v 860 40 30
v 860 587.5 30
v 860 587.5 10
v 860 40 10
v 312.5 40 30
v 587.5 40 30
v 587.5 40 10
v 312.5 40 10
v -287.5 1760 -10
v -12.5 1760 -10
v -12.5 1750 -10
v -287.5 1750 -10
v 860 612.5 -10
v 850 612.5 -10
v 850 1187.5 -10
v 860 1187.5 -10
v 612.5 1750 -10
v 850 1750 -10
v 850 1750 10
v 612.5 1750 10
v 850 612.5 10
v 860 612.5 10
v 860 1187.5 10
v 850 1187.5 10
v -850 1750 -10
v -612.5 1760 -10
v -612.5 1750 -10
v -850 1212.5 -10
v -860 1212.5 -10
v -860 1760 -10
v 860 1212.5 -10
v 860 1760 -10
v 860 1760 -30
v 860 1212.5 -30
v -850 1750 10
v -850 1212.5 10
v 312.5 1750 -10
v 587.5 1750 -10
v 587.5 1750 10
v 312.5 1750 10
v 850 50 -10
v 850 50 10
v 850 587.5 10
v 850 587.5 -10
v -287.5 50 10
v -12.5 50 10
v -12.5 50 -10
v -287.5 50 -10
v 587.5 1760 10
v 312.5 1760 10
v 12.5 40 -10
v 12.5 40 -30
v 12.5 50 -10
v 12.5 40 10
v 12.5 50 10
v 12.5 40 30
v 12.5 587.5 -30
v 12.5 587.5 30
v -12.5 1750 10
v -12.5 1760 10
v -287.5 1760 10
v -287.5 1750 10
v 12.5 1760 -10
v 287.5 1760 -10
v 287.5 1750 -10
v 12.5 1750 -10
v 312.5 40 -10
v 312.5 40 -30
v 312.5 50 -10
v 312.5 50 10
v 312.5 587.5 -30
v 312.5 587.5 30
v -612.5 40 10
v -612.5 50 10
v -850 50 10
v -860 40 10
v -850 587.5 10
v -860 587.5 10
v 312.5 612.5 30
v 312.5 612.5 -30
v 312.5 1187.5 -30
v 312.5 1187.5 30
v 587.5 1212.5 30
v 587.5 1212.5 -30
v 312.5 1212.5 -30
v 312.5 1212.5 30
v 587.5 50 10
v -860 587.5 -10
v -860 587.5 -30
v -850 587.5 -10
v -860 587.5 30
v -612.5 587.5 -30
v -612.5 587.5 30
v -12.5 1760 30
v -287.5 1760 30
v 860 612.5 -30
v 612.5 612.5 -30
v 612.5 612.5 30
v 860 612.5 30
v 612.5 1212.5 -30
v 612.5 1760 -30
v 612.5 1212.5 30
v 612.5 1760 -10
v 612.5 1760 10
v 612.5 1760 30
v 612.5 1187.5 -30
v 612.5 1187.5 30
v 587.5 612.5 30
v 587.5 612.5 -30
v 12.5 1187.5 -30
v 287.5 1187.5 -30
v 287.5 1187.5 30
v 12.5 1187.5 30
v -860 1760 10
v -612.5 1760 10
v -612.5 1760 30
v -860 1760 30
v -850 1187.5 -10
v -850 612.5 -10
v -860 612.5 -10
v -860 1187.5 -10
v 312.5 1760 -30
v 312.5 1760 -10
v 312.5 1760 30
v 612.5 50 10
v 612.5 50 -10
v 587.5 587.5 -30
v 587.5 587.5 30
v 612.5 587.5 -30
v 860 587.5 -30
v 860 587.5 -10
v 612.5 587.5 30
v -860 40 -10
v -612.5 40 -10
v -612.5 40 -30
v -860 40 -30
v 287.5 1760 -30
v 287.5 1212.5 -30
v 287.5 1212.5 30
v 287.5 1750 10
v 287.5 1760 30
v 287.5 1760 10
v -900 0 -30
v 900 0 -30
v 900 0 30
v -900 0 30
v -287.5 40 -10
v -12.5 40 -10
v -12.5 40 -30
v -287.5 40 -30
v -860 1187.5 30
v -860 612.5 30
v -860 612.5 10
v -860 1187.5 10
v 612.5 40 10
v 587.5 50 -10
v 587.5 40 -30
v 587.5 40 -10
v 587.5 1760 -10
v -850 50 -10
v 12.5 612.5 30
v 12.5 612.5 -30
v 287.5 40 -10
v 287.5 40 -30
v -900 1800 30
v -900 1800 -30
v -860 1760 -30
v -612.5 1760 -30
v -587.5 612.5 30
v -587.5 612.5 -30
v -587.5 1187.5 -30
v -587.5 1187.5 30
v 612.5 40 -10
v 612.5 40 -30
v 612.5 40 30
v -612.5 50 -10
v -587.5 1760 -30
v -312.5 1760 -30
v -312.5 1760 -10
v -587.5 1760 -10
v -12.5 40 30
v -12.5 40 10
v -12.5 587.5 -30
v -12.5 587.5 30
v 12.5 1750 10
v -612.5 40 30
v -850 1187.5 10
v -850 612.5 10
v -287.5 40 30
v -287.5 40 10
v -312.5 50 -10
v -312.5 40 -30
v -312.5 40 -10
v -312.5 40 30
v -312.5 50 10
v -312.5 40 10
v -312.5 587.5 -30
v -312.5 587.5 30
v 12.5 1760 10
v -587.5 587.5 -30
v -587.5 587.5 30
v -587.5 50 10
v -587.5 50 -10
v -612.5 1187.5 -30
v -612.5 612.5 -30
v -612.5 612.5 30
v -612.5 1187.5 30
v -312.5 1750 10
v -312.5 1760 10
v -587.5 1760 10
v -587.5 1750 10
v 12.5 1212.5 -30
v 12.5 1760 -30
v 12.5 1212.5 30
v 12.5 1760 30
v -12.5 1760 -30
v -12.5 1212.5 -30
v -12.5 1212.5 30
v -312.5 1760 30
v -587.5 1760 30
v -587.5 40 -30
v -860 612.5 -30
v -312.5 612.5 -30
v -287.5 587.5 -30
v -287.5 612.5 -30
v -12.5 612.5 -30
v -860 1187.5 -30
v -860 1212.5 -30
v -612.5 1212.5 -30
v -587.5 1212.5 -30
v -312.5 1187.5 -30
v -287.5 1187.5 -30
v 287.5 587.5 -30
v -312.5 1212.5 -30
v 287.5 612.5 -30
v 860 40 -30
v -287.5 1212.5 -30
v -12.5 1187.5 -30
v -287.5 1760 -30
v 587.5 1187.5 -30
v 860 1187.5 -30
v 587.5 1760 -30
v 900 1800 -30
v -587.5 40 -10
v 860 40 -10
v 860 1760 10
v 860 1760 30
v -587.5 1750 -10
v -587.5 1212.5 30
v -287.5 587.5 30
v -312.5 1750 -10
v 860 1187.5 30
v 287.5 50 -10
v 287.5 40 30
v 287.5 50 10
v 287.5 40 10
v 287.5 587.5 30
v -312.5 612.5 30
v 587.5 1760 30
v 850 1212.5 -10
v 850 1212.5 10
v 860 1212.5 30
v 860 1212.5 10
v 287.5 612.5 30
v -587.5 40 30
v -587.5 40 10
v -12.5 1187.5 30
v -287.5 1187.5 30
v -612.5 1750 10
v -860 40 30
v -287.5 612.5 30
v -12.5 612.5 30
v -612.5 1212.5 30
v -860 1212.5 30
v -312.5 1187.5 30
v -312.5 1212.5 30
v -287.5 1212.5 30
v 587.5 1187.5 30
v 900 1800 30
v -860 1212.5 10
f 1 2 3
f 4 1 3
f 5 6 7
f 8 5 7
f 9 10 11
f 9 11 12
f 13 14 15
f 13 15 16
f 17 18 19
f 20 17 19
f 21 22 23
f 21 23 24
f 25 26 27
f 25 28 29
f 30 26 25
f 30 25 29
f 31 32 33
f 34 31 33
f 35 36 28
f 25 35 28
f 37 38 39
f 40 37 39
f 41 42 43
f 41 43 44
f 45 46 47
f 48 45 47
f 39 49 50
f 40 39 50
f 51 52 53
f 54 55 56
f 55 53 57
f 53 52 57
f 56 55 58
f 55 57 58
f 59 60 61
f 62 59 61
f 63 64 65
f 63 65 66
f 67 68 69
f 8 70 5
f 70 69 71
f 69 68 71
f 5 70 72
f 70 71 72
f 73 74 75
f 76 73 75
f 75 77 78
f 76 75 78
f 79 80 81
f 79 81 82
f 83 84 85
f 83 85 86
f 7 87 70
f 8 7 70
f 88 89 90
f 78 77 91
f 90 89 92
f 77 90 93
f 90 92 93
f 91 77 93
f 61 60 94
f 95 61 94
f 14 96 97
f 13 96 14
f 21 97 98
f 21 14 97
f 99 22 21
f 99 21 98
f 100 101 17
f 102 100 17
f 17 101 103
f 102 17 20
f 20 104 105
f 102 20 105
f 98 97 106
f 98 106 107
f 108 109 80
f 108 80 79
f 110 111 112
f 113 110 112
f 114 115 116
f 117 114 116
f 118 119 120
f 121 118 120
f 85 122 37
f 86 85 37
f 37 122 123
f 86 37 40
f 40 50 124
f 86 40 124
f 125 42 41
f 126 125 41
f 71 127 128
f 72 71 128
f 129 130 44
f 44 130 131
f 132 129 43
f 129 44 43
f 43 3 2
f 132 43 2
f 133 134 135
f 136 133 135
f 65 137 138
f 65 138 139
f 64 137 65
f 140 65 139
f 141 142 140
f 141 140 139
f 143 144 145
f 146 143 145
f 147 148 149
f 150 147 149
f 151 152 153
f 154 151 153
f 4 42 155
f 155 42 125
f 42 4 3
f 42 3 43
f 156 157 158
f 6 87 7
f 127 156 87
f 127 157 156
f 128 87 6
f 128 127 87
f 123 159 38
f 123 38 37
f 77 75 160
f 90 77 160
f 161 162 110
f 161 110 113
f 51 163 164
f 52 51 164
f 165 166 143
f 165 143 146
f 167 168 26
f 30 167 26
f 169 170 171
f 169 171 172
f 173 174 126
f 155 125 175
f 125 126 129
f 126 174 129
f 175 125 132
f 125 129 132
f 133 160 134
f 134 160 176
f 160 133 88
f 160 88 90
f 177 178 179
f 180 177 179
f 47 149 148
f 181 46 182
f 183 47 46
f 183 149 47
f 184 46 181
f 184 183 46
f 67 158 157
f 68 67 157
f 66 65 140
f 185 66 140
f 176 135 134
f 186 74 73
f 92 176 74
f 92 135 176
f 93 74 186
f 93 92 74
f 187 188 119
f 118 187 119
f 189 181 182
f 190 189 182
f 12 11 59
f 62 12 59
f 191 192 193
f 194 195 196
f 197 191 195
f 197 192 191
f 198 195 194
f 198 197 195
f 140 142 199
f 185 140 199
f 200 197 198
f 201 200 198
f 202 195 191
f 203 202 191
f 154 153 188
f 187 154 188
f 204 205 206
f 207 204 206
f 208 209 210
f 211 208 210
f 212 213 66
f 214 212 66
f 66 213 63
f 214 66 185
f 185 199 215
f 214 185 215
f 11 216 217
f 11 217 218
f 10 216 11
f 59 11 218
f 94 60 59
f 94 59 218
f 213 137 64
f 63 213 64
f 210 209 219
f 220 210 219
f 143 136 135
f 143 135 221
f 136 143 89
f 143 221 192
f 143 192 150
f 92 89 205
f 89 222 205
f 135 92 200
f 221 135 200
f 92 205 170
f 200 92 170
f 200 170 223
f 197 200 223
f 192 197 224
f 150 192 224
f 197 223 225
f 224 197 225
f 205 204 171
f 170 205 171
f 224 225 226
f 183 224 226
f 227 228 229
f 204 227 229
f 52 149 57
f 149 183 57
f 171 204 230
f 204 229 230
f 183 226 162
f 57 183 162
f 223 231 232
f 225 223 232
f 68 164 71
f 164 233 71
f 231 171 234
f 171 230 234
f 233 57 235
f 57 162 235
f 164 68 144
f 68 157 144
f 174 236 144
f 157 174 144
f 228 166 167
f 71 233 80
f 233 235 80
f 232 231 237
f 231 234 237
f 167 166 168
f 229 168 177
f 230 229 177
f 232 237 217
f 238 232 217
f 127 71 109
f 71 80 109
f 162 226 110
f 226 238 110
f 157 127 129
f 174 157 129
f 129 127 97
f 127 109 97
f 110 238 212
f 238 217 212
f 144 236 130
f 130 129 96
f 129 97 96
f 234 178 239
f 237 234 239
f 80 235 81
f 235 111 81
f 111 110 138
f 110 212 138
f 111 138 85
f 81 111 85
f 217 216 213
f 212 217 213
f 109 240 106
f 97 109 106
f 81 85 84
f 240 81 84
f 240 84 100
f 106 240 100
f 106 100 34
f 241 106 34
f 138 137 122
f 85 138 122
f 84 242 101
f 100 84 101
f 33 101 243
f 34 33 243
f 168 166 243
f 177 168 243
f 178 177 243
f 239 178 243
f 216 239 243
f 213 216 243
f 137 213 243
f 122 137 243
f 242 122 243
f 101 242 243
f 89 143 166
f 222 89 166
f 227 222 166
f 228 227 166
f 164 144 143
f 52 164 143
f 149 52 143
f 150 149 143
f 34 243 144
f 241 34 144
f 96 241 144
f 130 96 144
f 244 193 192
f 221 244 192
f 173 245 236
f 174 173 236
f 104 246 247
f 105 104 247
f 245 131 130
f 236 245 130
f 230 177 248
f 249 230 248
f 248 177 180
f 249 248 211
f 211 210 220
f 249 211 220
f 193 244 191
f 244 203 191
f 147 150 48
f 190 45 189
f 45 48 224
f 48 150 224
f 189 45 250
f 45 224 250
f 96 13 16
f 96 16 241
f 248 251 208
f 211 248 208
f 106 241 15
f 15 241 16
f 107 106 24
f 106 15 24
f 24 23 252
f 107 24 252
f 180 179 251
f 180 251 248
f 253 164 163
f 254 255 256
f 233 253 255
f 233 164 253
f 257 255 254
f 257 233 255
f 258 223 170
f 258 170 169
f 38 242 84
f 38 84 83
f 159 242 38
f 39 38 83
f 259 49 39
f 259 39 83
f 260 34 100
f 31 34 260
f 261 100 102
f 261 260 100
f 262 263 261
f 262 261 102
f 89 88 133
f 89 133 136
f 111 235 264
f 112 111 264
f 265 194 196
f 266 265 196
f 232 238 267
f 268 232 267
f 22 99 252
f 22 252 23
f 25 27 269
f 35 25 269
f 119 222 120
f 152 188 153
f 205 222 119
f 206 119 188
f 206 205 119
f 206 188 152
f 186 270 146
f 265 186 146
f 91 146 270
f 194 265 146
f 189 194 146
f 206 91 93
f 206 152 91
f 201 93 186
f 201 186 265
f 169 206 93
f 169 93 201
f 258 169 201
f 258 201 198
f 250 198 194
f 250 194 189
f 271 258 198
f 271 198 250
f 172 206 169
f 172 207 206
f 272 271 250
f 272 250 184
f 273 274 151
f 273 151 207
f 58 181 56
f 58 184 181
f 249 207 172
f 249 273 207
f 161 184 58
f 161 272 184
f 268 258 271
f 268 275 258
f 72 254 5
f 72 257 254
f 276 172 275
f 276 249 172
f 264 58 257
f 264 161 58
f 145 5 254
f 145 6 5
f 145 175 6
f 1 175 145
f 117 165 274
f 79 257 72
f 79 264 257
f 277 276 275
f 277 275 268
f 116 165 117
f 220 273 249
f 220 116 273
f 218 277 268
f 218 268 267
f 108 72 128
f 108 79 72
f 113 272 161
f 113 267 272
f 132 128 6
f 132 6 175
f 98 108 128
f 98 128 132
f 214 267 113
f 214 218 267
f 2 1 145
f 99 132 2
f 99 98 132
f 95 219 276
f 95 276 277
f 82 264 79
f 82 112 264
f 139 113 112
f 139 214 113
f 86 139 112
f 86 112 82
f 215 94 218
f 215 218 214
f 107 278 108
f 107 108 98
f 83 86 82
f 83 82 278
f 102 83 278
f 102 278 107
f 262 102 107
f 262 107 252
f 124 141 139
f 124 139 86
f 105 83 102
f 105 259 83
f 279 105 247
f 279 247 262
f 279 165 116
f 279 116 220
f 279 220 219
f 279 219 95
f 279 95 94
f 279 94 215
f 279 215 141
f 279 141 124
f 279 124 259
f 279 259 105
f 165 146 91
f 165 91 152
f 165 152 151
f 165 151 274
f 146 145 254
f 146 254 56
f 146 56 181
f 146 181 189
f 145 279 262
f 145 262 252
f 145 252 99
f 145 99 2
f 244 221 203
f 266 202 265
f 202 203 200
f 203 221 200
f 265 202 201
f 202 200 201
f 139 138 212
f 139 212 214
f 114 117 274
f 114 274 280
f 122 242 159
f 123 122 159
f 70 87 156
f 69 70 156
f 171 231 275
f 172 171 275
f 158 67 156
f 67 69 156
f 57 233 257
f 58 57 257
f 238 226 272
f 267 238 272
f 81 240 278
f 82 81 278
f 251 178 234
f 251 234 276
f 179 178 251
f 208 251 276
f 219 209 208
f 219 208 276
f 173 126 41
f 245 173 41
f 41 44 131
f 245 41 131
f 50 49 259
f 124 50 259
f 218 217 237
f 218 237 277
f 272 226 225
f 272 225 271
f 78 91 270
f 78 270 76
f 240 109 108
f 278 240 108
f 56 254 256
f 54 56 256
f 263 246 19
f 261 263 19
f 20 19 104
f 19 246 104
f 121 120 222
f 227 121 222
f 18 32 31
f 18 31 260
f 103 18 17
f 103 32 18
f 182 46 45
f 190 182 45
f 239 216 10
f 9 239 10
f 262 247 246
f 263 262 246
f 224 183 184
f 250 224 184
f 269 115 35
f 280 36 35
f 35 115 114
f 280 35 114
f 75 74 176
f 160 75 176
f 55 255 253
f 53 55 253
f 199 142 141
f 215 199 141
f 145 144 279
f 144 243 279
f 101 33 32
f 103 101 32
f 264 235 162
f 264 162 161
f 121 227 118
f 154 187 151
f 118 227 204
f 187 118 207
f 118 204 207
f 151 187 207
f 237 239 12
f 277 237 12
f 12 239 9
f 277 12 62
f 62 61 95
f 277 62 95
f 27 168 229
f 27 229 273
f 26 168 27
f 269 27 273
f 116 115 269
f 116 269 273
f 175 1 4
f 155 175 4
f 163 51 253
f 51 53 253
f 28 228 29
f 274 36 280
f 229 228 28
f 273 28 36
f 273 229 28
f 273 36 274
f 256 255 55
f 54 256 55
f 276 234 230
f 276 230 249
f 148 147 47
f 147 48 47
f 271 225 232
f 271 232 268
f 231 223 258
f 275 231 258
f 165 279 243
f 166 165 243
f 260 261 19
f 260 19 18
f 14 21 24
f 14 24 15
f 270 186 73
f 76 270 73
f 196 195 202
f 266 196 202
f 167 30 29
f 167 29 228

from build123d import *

# Parameters (mm, degrees)
EXTRUDE_1_DEPTH        = 900
EXTRUDE_1_2_DEPTH      = 900
EXTRUDE_2_DEPTH        = 1720
EXTRUDE_2_2_DEPTH      = 1720
SKETCH_4_W             = 50
SKETCH_4_H             = 60
CUT_EXTRUDE_1_DEPTH    = 10
SKETCH_5_W             = 50
SKETCH_5_H             = 60
CUT_EXTRUDE_2_DEPTH    = 10
SKETCH_6_W             = 60
SKETCH_6_H             = 25
EXTRUDE_3_DEPTH        = 1720
PATTERN_LINEAR_1_COUNT = 2
PATTERN_LINEAR_1_PITCH = 600
SKETCH_7_W             = 25
SKETCH_7_H             = 60
EXTRUDE_4_DEPTH        = 1729
PATTERN_LINEAR_2_COUNT = 5
PATTERN_LINEAR_2_PITCH = 300


with BuildPart() as part:
    # 草图1 → 凸台-拉伸1 (new, symmetric)
    with BuildSketch(Plane(origin=(0, 0, 0), x_dir=(0, 0, -1), z_dir=(1, 0, 0))):
        Polygon((30, 0), (-30, 0), (-30, 40), (-10, 40), (-10, 50), (10, 50), (10, 40), (30, 40), align=None)
    extrude(amount=EXTRUDE_1_DEPTH, both=True)

    # 草图5 → 切除-拉伸2 (cut)
    with BuildSketch(Plane(origin=(0, 40, 0), x_dir=(1, 0, 0), z_dir=(0, 1, 0))):
        with Locations((-875, 0)):
            Rectangle(SKETCH_5_W, SKETCH_5_H)
        with Locations((875, 0)):
            Rectangle(SKETCH_5_W, SKETCH_5_H)
    extrude(amount=CUT_EXTRUDE_2_DEPTH, mode=Mode.SUBTRACT)



with BuildPart() as body_2:
    # 草图1 → Extrude 1 2 (new, symmetric)
    with BuildSketch(Plane(origin=(0, 0, 0), x_dir=(0, 0, -1), z_dir=(1, 0, 0))):
        Polygon((30, 1800), (30, 1760), (10, 1760), (10, 1750), (-10, 1750), (-10, 1760), (-30, 1760), (-30, 1800), align=None)
    extrude(amount=EXTRUDE_1_2_DEPTH, both=True)

    # 草图4 → 切除-拉伸1 (cut)
    with BuildSketch(Plane.XZ.offset(-1760)):
        with Locations((-875, 0)):
            Rectangle(SKETCH_4_W, SKETCH_4_H)
        with Locations((875, 0)):
            Rectangle(SKETCH_4_W, SKETCH_4_H)
    extrude(amount=CUT_EXTRUDE_1_DEPTH, mode=Mode.SUBTRACT)


with BuildPart() as body_3:
    # 草图3 → 凸台-拉伸2 (new body)
    with BuildSketch(Plane.XZ.offset(-1760)):
        Polygon((-900, -30), (-900, 30), (-860, 30), (-860, 10), (-850, 10), (-850, -10), (-860, -10), (-860, -30), align=None)
    extrude(amount=EXTRUDE_2_DEPTH)



with BuildPart() as body_4:
    # 草图3 → Extrude 2 2 (new body)
    with BuildSketch(Plane.XZ.offset(-1760)):
        Polygon((860, -30), (900, -30), (900, 30), (860, 30), (860, 10), (850, 10), (850, -10), (860, -10), align=None)
    extrude(amount=EXTRUDE_2_2_DEPTH)


with BuildPart() as body_3_1:
    add(body_3.part)

    add(body_4.part)  # 凸台-拉伸3 merges body 4
    # 草图6 → 凸台-拉伸3 (add)
    with BuildSketch(Plane.ZY.offset(-860)):
        with Locations((0, 1200)):
            Rectangle(SKETCH_6_W, SKETCH_6_H)
    extrude_3 = extrude(amount=EXTRUDE_3_DEPTH)

    # 阵列(线性)1: 凸台-拉伸3 ×2
    with Locations(*[(0, -i * PATTERN_LINEAR_1_PITCH, 0) for i in range(1, PATTERN_LINEAR_1_COUNT)]):
        add(extrude_3)


with BuildPart() as part_1:
    add(part.part)

    add(body_2.part)  # 凸台-拉伸4 merges body 2

    add(body_3_1.part)  # 凸台-拉伸4 merges body 3
    # 草图7 → 凸台-拉伸4 (add)
    with BuildSketch(Plane.XZ.offset(-1760)):
        with Locations((-600, 0)):
            Rectangle(SKETCH_7_W, SKETCH_7_H)
    extrude_4 = extrude(amount=EXTRUDE_4_DEPTH)

    # 阵列(线性)2: 凸台-拉伸4 ×5
    with Locations(*[(i * PATTERN_LINEAR_2_PITCH, 0, 0) for i in range(1, PATTERN_LINEAR_2_COUNT)]):
        add(extrude_4)


solid = part_1.part
